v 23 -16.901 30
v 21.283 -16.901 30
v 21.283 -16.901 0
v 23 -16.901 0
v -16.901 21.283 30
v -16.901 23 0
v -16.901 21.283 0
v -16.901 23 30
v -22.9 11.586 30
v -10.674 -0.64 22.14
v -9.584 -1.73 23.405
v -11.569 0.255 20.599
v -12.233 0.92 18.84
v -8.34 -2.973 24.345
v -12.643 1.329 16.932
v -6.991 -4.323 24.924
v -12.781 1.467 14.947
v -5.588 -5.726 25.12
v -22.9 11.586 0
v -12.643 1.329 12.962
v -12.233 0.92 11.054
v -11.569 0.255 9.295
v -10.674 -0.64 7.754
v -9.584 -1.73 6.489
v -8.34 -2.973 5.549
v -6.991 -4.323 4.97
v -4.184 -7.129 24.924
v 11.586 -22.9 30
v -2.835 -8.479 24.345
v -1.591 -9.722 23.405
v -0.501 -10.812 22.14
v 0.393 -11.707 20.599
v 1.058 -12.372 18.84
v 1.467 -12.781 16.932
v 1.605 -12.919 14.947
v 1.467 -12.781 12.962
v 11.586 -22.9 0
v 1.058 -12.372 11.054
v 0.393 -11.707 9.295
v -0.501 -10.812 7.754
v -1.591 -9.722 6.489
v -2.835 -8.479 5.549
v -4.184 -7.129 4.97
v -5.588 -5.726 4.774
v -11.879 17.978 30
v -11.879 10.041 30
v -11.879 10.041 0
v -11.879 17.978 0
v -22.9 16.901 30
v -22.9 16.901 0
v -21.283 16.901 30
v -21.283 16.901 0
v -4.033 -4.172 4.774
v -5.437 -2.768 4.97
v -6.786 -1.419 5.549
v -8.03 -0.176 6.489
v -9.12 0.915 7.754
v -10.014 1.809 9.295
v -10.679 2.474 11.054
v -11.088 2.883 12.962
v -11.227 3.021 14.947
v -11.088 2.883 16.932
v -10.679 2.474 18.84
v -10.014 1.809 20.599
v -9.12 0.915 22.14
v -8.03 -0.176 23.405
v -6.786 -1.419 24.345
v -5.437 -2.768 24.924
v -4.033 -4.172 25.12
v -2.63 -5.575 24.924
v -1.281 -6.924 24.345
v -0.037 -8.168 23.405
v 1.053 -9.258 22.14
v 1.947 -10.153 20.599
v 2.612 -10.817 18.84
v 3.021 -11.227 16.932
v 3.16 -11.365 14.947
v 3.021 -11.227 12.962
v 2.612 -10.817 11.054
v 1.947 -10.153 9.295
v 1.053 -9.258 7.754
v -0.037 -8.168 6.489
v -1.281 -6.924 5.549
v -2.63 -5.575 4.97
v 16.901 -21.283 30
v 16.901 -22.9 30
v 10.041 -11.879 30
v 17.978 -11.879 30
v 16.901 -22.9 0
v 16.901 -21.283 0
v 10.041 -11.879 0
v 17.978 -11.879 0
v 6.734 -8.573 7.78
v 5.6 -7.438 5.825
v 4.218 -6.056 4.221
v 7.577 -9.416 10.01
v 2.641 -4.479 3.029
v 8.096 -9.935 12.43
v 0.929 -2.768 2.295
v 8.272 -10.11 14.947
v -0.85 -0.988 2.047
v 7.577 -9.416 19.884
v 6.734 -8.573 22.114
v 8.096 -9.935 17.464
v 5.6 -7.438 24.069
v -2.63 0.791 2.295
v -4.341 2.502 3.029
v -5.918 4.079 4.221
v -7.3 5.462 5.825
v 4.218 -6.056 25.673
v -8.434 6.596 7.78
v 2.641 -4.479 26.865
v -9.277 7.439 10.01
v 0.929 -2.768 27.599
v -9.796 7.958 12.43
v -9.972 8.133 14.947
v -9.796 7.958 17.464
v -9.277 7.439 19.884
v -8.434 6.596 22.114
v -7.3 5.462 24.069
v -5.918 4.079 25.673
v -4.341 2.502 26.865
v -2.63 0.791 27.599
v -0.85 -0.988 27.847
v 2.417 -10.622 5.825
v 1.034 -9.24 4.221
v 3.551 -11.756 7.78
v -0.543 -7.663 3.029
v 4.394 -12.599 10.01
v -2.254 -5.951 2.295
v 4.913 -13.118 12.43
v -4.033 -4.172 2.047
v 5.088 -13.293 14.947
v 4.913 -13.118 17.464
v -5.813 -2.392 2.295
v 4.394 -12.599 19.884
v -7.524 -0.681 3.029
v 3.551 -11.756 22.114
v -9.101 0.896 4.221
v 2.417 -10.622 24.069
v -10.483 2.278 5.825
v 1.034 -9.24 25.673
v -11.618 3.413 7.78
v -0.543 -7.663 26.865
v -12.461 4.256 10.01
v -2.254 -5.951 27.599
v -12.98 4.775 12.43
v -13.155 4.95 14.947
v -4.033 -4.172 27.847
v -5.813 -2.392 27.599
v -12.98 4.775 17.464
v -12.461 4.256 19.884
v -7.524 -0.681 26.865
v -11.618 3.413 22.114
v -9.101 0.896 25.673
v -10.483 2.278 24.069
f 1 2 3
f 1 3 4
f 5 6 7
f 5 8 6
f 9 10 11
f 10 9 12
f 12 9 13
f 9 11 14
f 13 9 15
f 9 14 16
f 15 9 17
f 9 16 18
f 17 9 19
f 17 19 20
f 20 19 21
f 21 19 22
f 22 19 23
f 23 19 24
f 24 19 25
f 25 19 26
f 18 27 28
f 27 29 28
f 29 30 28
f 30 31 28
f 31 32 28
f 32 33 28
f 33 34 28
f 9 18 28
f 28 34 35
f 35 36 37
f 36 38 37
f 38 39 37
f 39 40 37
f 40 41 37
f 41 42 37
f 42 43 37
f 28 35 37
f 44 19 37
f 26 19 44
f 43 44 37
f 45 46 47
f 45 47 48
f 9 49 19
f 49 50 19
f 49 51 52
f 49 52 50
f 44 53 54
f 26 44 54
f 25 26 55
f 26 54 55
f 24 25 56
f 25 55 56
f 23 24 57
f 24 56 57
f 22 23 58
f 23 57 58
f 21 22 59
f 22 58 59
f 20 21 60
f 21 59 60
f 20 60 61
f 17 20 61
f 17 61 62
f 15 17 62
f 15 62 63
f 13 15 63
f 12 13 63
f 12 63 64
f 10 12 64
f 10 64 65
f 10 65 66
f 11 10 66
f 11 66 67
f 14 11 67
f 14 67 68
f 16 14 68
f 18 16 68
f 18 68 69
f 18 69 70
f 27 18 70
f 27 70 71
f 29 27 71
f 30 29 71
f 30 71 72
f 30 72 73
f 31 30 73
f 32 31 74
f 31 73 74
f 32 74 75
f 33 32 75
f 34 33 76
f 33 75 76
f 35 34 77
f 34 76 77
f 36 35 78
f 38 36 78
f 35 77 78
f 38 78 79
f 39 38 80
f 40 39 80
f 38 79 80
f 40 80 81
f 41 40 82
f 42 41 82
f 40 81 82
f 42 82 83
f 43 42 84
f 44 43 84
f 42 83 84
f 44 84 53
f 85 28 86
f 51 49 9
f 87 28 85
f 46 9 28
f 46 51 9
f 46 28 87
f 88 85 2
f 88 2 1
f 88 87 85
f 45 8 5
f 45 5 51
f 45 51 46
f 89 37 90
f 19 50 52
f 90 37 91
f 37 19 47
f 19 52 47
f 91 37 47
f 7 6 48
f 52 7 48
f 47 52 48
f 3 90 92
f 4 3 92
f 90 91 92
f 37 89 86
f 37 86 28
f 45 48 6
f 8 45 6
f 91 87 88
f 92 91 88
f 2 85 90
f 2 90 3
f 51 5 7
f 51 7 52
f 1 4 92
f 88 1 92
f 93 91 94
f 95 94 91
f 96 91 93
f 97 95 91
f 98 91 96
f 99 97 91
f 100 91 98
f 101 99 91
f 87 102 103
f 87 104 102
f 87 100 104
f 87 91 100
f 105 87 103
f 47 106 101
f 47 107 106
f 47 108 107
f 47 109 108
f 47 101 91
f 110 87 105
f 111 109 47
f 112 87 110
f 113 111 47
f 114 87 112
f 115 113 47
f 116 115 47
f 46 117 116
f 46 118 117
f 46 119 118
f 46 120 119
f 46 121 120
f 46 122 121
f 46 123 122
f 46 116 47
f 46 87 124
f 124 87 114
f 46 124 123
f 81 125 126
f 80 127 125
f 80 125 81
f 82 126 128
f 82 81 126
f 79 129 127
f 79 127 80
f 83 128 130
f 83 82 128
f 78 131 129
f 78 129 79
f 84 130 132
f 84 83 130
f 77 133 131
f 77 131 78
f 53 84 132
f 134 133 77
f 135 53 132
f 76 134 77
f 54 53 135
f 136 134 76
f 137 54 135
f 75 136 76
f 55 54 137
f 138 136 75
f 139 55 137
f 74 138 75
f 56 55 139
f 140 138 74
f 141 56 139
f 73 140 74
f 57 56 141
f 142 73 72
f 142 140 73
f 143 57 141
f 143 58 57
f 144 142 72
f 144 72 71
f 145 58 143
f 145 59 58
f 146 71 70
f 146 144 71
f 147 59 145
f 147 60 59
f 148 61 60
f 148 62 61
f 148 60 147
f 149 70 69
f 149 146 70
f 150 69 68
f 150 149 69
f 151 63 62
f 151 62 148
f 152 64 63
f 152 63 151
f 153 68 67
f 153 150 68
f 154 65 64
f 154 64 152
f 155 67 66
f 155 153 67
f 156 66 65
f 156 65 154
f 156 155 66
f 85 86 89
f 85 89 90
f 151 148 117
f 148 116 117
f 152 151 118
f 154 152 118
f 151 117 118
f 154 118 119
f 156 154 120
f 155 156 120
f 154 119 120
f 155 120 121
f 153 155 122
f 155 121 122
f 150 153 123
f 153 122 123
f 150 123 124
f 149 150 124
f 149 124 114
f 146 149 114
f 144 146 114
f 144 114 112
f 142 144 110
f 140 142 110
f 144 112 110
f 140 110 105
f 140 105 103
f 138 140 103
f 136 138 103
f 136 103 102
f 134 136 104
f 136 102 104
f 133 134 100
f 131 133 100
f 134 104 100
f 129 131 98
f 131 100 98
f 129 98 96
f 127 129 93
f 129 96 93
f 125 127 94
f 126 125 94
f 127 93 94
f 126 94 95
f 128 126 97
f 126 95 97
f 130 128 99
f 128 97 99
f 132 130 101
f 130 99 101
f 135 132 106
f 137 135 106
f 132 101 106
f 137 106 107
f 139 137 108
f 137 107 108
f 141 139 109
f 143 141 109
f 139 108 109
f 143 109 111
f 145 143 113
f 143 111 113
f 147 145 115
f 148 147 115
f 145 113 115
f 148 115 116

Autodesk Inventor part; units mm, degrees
ref_plane "YZ Plane" through (0, 0, 0) normal (1, 0, 0) x (0, 1, 0)
ref_plane "XZ Plane" through (0, 0, 0) normal (0, 1, 0) x (-1, 0, 0)
sketch "Sketch1" plane through (0, 0, 0) normal (0, 0, 1) x (1, 0, 0)
  line L0 (-16.9, 21.4) -> (-16.9, 16.9) construction
  arc A0 (-22.9, 19.9) -> (-19.9, 22.9) centre (-19.9, 19.9) ccw construction
  line L1 (-16.9, 16.9) -> (16.9, 16.9) construction
  line L2 (16.9, 16.9) -> (16.9, -16.9) construction
  line L3 (16.9, -16.9) -> (-16.9, -16.9) construction
  line L4 (-16.9, -16.9) -> (-16.9, 16.9) construction
  arc A1 (22.9, -19.9) -> (19.9, -22.9) centre (19.9, -19.9) ccw construction
  line L5 (22.9, 19.9) -> (22.9, -19.9) construction
  arc A2 (19.9, 22.9) -> (22.9, 19.9) centre (19.9, 19.9) ccw construction
  line L6 (-19.9, 22.9) -> (19.9, 22.9) construction
  arc A3 (-22.9, 19.9) -> (-19.9, 22.9) centre (-19.9, 19.9) ccw construction
  line L7 (-22.9, -19.9) -> (-22.9, 19.9) construction
  arc A4 (-19.9, -22.9) -> (-22.9, -19.9) centre (-19.9, -19.9) ccw construction
  line L8 (19.9, -22.9) -> (-19.9, -22.9) construction
  line L9 (-21.4, 16.9) -> (-16.9, 16.9) construction
  line L10 (-16.9, -16.9) -> (-21.4, -16.9) construction
  line L11 (-16.9, -16.9) -> (-16.9, -21.4) construction
  line L12 (16.9, -21.4) -> (16.9, -16.9) construction
  line L13 (21.4, -16.9) -> (16.9, -16.9) construction
  line L14 (16.9, 16.9) -> (21.4, 16.9) construction
  line L15 (16.9, 16.9) -> (16.9, 21.4) construction
  line L16 (-16.8009, 21.2415) -> (21.2415, -16.8009)
  line L17 (21.2415, -16.8009) -> (16.8009, -21.2415)
  line L18 (16.8009, -21.2415) -> (-21.2415, 16.8009)
  line L19 (-21.2415, 16.8009) -> (-16.8009, 21.2415)
  line L20 (-16.8009, 21.2415) -> (16.8009, -21.2415) construction
  line L21 (21.2415, -16.8009) -> (-21.2415, 16.8009) construction
  line L22 (-16.8009, 21.2415) -> (36.9991, 21.2415) construction
  line L23 (-21.2415, 16.8009) -> (-22.9, 16.8009)
  line L24 (16.8009, -21.2415) -> (16.8009, -22.9)
  line L25 (16.8009, -22.9) -> (-22.9, 16.8009)
  line L26 (-16.8009, 21.2415) -> (-16.8009, 22.9)
  line L27 (21.2415, -16.8009) -> (22.9, -16.8009)
  line L28 (22.9, -16.8009) -> (-16.8009, 22.9)
  line L29 (-22.9, 16.8009) -> (-22.9, 11.5863)
  line L30 (16.8009, -22.9) -> (11.5863, -22.9)
  line L31 (-22.9, 11.5863) -> (11.5863, -22.9)
  point P0 (0, 0)
  dimension "d0" = 53.8
  dimension "d1" = 45
  dimension "d2" = 6.28
  dimension "d5" = 8
extrude "Extrusion1" add sketch "Sketch1" along normal blind 30
ref_plane "Work Plane1" through (16.9, -16.9, -8) normal (-0.7071, -0.7071, 0) x (0, 0, 1)
sketch "Sketch7" plane through (0, 0, 30) normal (0, 0, 1) x (1, 0, 0)
  line L0 (21.2415, -16.8009) -> (22.9, -16.8009) projected
  line L1 (22.9, -16.8009) -> (-16.8009, 22.9) projected
  line L2 (-16.8009, 22.9) -> (-16.8009, 21.2415) projected
  line L3 (-16.8009, 21.2415) -> (-21.2415, 16.8009) projected
  line L4 (-21.2415, 16.8009) -> (-22.9, 16.8009) projected
  line L5 (-22.9, 16.8009) -> (-22.9, 11.5863) projected
  line L6 (-22.9, 11.5863) -> (11.5863, -22.9) projected
  line L7 (11.5863, -22.9) -> (16.8009, -22.9) projected
  line L8 (16.8009, -22.9) -> (16.8009, -21.2415) projected
  line L9 (16.8009, -21.2415) -> (21.2415, -16.8009) projected
  line L10 (3.0496, 3.0496) -> (-5.6569, -5.6569)
  line L11 (-22.9, 11.5863) -> (11.5863, -22.9) projected
  line L12 (17.9785, -3.9418) -> (10.0409, -11.8794)
  line L13 (10.0409, -11.8794) -> (-11.8794, 10.0409)
  line L14 (-11.8794, 10.0409) -> (-3.9418, 17.9785)
  line L15 (-3.9418, 17.9785) -> (17.9785, -3.9418)
  line L16 (17.9785, -3.9418) -> (-11.8794, 10.0409) construction
  line L17 (10.0409, -11.8794) -> (-3.9418, 17.9785) construction
  line L18 (-11.8794, 10.0409) -> (-11.8794, 17.9785)
  line L19 (22.9, -16.8009) -> (-16.8009, 22.9) projected
  line L20 (10.0409, -11.8794) -> (17.9785, -11.8794)
  point P0 (0, 0)
  dimension "d28" = 31
  dimension "d29" = 1.3
extrude "Extrusion7" cut sketch "Sketch7" against normal through all contours L20 L12 L1 | L12 L13 L10 L1 | L1 L14 L15 L12 | L10 L13 L14 L1 | L14 L18 L1
sketch "Sketch13" plane through (0, 0, 30) normal (0, 0, 1) x (1, 0, 0)
  line L0 (-11.8794, 10.0409) -> (-11.8794, 17.9785) construction
  line L1 (-11.8794, 17.9785) -> (-16.8009, 22.9) construction
  line L2 (-16.8009, 22.9) -> (-16.8009, 21.2415) projected
  line L3 (-16.8009, 21.2415) -> (-21.2415, 16.8009) projected
  line L4 (-21.2415, 16.8009) -> (-22.9, 16.8009) projected
  line L5 (-22.9, 16.8009) -> (-22.9, 11.5863) construction
  line L6 (-22.9, 11.5863) -> (11.5863, -22.9) construction
  line L7 (11.5863, -22.9) -> (16.8009, -22.9) construction
  line L8 (16.8009, -22.9) -> (16.8009, -21.2415) projected
  line L9 (16.8009, -21.2415) -> (21.2415, -16.8009) projected
  line L10 (21.2415, -16.8009) -> (22.9, -16.8009) projected
  line L11 (22.9, -16.8009) -> (17.9785, -11.8794) construction
  line L12 (17.9785, -11.8794) -> (10.0409, -11.8794) construction
  line L13 (10.0409, -11.8794) -> (-11.8794, 10.0409) construction
  line L14 (-11.7794, 10.0823) -> (-11.7794, 18.02) construction
  line L15 (-11.7794, 18.02) -> (-16.9009, 23.1414) construction
  line L16 (-16.9009, 23.1414) -> (-16.9009, 21.2829)
  line L17 (-16.9009, 21.2829) -> (-21.2829, 16.9009)
  line L18 (-21.2829, 16.9009) -> (-23, 16.9009)
  line L19 (-23, 16.9009) -> (-23, 11.5449) construction
  line L20 (-23, 11.5449) -> (11.5449, -23) construction
  line L21 (11.5449, -23) -> (16.9009, -23) construction
  line L22 (16.9009, -23) -> (16.9009, -21.2829)
  line L23 (16.9009, -21.2829) -> (21.2829, -16.9009)
  line L24 (21.2829, -16.9009) -> (23.1414, -16.9009)
  line L25 (23.1414, -16.9009) -> (18.02, -11.7794) construction
  line L26 (18.02, -11.7794) -> (10.0823, -11.7794) construction
  line L27 (10.0823, -11.7794) -> (-11.7794, 10.0823) construction
  line L28 (16.8009, -22.9) -> (16.9009, -22.9)
  line L29 (22.9, -16.8009) -> (23, -16.9009)
  line L30 (-21.2415, 16.8009) -> (-22.9, 16.8009) projected
  line L31 (-22.9, 16.8009) -> (-22.9, 16.9009)
  line L32 (-16.8009, 22.9) -> (-16.9009, 23)
  point P0 (0, 0)
  dimension "d65" = 0.1
extrude "IM_offset" add sketch "Sketch13" against normal up to surface (30 mm away)
sketch "Sketch14" plane through (-11.8794, 10.0409, 0) normal (0.7071, 0.7071, 0) x (-0.7071, 0.7071, 0)
  circle A0 centre (-15.5978, 14.947) radius 12.7 projected
  circle A1 centre (-15.5978, 14.947) radius 12.9
  point P0 (-15.5, 0)
  dimension "d68" = 0.2
ref_plane "Work Plane4" through (-4.0321, -4.1704, -0.5659) normal (-0.7071, -0.7071, 0) x (0.204, -0.204, 0.9575)
extrude "Extrusion11" cut sketch "Sketch14" against normal up to surface (4.5 mm away) contours A0 | A1
sketch "Sketch15" plane through (-4.0321, -4.1704, 14.947) normal (0.7071, 0.7071, 0) x (0, 0, -1)
  circle A0 centre (0, 0) radius 12.45 projected
  circle A1 centre (0, 0) radius 10.1726
  point P0 (14.947, 0.0978)
extrude "Extrusion12" cut sketch "Sketch15" against normal through all contours A1
equation "\"d3\" = MirrorThickness1"
equation "\"MirrorThickness1\" = 30"
properties part number "20_Cube_Insert_Mirror_Holder_wLogo_v3"
